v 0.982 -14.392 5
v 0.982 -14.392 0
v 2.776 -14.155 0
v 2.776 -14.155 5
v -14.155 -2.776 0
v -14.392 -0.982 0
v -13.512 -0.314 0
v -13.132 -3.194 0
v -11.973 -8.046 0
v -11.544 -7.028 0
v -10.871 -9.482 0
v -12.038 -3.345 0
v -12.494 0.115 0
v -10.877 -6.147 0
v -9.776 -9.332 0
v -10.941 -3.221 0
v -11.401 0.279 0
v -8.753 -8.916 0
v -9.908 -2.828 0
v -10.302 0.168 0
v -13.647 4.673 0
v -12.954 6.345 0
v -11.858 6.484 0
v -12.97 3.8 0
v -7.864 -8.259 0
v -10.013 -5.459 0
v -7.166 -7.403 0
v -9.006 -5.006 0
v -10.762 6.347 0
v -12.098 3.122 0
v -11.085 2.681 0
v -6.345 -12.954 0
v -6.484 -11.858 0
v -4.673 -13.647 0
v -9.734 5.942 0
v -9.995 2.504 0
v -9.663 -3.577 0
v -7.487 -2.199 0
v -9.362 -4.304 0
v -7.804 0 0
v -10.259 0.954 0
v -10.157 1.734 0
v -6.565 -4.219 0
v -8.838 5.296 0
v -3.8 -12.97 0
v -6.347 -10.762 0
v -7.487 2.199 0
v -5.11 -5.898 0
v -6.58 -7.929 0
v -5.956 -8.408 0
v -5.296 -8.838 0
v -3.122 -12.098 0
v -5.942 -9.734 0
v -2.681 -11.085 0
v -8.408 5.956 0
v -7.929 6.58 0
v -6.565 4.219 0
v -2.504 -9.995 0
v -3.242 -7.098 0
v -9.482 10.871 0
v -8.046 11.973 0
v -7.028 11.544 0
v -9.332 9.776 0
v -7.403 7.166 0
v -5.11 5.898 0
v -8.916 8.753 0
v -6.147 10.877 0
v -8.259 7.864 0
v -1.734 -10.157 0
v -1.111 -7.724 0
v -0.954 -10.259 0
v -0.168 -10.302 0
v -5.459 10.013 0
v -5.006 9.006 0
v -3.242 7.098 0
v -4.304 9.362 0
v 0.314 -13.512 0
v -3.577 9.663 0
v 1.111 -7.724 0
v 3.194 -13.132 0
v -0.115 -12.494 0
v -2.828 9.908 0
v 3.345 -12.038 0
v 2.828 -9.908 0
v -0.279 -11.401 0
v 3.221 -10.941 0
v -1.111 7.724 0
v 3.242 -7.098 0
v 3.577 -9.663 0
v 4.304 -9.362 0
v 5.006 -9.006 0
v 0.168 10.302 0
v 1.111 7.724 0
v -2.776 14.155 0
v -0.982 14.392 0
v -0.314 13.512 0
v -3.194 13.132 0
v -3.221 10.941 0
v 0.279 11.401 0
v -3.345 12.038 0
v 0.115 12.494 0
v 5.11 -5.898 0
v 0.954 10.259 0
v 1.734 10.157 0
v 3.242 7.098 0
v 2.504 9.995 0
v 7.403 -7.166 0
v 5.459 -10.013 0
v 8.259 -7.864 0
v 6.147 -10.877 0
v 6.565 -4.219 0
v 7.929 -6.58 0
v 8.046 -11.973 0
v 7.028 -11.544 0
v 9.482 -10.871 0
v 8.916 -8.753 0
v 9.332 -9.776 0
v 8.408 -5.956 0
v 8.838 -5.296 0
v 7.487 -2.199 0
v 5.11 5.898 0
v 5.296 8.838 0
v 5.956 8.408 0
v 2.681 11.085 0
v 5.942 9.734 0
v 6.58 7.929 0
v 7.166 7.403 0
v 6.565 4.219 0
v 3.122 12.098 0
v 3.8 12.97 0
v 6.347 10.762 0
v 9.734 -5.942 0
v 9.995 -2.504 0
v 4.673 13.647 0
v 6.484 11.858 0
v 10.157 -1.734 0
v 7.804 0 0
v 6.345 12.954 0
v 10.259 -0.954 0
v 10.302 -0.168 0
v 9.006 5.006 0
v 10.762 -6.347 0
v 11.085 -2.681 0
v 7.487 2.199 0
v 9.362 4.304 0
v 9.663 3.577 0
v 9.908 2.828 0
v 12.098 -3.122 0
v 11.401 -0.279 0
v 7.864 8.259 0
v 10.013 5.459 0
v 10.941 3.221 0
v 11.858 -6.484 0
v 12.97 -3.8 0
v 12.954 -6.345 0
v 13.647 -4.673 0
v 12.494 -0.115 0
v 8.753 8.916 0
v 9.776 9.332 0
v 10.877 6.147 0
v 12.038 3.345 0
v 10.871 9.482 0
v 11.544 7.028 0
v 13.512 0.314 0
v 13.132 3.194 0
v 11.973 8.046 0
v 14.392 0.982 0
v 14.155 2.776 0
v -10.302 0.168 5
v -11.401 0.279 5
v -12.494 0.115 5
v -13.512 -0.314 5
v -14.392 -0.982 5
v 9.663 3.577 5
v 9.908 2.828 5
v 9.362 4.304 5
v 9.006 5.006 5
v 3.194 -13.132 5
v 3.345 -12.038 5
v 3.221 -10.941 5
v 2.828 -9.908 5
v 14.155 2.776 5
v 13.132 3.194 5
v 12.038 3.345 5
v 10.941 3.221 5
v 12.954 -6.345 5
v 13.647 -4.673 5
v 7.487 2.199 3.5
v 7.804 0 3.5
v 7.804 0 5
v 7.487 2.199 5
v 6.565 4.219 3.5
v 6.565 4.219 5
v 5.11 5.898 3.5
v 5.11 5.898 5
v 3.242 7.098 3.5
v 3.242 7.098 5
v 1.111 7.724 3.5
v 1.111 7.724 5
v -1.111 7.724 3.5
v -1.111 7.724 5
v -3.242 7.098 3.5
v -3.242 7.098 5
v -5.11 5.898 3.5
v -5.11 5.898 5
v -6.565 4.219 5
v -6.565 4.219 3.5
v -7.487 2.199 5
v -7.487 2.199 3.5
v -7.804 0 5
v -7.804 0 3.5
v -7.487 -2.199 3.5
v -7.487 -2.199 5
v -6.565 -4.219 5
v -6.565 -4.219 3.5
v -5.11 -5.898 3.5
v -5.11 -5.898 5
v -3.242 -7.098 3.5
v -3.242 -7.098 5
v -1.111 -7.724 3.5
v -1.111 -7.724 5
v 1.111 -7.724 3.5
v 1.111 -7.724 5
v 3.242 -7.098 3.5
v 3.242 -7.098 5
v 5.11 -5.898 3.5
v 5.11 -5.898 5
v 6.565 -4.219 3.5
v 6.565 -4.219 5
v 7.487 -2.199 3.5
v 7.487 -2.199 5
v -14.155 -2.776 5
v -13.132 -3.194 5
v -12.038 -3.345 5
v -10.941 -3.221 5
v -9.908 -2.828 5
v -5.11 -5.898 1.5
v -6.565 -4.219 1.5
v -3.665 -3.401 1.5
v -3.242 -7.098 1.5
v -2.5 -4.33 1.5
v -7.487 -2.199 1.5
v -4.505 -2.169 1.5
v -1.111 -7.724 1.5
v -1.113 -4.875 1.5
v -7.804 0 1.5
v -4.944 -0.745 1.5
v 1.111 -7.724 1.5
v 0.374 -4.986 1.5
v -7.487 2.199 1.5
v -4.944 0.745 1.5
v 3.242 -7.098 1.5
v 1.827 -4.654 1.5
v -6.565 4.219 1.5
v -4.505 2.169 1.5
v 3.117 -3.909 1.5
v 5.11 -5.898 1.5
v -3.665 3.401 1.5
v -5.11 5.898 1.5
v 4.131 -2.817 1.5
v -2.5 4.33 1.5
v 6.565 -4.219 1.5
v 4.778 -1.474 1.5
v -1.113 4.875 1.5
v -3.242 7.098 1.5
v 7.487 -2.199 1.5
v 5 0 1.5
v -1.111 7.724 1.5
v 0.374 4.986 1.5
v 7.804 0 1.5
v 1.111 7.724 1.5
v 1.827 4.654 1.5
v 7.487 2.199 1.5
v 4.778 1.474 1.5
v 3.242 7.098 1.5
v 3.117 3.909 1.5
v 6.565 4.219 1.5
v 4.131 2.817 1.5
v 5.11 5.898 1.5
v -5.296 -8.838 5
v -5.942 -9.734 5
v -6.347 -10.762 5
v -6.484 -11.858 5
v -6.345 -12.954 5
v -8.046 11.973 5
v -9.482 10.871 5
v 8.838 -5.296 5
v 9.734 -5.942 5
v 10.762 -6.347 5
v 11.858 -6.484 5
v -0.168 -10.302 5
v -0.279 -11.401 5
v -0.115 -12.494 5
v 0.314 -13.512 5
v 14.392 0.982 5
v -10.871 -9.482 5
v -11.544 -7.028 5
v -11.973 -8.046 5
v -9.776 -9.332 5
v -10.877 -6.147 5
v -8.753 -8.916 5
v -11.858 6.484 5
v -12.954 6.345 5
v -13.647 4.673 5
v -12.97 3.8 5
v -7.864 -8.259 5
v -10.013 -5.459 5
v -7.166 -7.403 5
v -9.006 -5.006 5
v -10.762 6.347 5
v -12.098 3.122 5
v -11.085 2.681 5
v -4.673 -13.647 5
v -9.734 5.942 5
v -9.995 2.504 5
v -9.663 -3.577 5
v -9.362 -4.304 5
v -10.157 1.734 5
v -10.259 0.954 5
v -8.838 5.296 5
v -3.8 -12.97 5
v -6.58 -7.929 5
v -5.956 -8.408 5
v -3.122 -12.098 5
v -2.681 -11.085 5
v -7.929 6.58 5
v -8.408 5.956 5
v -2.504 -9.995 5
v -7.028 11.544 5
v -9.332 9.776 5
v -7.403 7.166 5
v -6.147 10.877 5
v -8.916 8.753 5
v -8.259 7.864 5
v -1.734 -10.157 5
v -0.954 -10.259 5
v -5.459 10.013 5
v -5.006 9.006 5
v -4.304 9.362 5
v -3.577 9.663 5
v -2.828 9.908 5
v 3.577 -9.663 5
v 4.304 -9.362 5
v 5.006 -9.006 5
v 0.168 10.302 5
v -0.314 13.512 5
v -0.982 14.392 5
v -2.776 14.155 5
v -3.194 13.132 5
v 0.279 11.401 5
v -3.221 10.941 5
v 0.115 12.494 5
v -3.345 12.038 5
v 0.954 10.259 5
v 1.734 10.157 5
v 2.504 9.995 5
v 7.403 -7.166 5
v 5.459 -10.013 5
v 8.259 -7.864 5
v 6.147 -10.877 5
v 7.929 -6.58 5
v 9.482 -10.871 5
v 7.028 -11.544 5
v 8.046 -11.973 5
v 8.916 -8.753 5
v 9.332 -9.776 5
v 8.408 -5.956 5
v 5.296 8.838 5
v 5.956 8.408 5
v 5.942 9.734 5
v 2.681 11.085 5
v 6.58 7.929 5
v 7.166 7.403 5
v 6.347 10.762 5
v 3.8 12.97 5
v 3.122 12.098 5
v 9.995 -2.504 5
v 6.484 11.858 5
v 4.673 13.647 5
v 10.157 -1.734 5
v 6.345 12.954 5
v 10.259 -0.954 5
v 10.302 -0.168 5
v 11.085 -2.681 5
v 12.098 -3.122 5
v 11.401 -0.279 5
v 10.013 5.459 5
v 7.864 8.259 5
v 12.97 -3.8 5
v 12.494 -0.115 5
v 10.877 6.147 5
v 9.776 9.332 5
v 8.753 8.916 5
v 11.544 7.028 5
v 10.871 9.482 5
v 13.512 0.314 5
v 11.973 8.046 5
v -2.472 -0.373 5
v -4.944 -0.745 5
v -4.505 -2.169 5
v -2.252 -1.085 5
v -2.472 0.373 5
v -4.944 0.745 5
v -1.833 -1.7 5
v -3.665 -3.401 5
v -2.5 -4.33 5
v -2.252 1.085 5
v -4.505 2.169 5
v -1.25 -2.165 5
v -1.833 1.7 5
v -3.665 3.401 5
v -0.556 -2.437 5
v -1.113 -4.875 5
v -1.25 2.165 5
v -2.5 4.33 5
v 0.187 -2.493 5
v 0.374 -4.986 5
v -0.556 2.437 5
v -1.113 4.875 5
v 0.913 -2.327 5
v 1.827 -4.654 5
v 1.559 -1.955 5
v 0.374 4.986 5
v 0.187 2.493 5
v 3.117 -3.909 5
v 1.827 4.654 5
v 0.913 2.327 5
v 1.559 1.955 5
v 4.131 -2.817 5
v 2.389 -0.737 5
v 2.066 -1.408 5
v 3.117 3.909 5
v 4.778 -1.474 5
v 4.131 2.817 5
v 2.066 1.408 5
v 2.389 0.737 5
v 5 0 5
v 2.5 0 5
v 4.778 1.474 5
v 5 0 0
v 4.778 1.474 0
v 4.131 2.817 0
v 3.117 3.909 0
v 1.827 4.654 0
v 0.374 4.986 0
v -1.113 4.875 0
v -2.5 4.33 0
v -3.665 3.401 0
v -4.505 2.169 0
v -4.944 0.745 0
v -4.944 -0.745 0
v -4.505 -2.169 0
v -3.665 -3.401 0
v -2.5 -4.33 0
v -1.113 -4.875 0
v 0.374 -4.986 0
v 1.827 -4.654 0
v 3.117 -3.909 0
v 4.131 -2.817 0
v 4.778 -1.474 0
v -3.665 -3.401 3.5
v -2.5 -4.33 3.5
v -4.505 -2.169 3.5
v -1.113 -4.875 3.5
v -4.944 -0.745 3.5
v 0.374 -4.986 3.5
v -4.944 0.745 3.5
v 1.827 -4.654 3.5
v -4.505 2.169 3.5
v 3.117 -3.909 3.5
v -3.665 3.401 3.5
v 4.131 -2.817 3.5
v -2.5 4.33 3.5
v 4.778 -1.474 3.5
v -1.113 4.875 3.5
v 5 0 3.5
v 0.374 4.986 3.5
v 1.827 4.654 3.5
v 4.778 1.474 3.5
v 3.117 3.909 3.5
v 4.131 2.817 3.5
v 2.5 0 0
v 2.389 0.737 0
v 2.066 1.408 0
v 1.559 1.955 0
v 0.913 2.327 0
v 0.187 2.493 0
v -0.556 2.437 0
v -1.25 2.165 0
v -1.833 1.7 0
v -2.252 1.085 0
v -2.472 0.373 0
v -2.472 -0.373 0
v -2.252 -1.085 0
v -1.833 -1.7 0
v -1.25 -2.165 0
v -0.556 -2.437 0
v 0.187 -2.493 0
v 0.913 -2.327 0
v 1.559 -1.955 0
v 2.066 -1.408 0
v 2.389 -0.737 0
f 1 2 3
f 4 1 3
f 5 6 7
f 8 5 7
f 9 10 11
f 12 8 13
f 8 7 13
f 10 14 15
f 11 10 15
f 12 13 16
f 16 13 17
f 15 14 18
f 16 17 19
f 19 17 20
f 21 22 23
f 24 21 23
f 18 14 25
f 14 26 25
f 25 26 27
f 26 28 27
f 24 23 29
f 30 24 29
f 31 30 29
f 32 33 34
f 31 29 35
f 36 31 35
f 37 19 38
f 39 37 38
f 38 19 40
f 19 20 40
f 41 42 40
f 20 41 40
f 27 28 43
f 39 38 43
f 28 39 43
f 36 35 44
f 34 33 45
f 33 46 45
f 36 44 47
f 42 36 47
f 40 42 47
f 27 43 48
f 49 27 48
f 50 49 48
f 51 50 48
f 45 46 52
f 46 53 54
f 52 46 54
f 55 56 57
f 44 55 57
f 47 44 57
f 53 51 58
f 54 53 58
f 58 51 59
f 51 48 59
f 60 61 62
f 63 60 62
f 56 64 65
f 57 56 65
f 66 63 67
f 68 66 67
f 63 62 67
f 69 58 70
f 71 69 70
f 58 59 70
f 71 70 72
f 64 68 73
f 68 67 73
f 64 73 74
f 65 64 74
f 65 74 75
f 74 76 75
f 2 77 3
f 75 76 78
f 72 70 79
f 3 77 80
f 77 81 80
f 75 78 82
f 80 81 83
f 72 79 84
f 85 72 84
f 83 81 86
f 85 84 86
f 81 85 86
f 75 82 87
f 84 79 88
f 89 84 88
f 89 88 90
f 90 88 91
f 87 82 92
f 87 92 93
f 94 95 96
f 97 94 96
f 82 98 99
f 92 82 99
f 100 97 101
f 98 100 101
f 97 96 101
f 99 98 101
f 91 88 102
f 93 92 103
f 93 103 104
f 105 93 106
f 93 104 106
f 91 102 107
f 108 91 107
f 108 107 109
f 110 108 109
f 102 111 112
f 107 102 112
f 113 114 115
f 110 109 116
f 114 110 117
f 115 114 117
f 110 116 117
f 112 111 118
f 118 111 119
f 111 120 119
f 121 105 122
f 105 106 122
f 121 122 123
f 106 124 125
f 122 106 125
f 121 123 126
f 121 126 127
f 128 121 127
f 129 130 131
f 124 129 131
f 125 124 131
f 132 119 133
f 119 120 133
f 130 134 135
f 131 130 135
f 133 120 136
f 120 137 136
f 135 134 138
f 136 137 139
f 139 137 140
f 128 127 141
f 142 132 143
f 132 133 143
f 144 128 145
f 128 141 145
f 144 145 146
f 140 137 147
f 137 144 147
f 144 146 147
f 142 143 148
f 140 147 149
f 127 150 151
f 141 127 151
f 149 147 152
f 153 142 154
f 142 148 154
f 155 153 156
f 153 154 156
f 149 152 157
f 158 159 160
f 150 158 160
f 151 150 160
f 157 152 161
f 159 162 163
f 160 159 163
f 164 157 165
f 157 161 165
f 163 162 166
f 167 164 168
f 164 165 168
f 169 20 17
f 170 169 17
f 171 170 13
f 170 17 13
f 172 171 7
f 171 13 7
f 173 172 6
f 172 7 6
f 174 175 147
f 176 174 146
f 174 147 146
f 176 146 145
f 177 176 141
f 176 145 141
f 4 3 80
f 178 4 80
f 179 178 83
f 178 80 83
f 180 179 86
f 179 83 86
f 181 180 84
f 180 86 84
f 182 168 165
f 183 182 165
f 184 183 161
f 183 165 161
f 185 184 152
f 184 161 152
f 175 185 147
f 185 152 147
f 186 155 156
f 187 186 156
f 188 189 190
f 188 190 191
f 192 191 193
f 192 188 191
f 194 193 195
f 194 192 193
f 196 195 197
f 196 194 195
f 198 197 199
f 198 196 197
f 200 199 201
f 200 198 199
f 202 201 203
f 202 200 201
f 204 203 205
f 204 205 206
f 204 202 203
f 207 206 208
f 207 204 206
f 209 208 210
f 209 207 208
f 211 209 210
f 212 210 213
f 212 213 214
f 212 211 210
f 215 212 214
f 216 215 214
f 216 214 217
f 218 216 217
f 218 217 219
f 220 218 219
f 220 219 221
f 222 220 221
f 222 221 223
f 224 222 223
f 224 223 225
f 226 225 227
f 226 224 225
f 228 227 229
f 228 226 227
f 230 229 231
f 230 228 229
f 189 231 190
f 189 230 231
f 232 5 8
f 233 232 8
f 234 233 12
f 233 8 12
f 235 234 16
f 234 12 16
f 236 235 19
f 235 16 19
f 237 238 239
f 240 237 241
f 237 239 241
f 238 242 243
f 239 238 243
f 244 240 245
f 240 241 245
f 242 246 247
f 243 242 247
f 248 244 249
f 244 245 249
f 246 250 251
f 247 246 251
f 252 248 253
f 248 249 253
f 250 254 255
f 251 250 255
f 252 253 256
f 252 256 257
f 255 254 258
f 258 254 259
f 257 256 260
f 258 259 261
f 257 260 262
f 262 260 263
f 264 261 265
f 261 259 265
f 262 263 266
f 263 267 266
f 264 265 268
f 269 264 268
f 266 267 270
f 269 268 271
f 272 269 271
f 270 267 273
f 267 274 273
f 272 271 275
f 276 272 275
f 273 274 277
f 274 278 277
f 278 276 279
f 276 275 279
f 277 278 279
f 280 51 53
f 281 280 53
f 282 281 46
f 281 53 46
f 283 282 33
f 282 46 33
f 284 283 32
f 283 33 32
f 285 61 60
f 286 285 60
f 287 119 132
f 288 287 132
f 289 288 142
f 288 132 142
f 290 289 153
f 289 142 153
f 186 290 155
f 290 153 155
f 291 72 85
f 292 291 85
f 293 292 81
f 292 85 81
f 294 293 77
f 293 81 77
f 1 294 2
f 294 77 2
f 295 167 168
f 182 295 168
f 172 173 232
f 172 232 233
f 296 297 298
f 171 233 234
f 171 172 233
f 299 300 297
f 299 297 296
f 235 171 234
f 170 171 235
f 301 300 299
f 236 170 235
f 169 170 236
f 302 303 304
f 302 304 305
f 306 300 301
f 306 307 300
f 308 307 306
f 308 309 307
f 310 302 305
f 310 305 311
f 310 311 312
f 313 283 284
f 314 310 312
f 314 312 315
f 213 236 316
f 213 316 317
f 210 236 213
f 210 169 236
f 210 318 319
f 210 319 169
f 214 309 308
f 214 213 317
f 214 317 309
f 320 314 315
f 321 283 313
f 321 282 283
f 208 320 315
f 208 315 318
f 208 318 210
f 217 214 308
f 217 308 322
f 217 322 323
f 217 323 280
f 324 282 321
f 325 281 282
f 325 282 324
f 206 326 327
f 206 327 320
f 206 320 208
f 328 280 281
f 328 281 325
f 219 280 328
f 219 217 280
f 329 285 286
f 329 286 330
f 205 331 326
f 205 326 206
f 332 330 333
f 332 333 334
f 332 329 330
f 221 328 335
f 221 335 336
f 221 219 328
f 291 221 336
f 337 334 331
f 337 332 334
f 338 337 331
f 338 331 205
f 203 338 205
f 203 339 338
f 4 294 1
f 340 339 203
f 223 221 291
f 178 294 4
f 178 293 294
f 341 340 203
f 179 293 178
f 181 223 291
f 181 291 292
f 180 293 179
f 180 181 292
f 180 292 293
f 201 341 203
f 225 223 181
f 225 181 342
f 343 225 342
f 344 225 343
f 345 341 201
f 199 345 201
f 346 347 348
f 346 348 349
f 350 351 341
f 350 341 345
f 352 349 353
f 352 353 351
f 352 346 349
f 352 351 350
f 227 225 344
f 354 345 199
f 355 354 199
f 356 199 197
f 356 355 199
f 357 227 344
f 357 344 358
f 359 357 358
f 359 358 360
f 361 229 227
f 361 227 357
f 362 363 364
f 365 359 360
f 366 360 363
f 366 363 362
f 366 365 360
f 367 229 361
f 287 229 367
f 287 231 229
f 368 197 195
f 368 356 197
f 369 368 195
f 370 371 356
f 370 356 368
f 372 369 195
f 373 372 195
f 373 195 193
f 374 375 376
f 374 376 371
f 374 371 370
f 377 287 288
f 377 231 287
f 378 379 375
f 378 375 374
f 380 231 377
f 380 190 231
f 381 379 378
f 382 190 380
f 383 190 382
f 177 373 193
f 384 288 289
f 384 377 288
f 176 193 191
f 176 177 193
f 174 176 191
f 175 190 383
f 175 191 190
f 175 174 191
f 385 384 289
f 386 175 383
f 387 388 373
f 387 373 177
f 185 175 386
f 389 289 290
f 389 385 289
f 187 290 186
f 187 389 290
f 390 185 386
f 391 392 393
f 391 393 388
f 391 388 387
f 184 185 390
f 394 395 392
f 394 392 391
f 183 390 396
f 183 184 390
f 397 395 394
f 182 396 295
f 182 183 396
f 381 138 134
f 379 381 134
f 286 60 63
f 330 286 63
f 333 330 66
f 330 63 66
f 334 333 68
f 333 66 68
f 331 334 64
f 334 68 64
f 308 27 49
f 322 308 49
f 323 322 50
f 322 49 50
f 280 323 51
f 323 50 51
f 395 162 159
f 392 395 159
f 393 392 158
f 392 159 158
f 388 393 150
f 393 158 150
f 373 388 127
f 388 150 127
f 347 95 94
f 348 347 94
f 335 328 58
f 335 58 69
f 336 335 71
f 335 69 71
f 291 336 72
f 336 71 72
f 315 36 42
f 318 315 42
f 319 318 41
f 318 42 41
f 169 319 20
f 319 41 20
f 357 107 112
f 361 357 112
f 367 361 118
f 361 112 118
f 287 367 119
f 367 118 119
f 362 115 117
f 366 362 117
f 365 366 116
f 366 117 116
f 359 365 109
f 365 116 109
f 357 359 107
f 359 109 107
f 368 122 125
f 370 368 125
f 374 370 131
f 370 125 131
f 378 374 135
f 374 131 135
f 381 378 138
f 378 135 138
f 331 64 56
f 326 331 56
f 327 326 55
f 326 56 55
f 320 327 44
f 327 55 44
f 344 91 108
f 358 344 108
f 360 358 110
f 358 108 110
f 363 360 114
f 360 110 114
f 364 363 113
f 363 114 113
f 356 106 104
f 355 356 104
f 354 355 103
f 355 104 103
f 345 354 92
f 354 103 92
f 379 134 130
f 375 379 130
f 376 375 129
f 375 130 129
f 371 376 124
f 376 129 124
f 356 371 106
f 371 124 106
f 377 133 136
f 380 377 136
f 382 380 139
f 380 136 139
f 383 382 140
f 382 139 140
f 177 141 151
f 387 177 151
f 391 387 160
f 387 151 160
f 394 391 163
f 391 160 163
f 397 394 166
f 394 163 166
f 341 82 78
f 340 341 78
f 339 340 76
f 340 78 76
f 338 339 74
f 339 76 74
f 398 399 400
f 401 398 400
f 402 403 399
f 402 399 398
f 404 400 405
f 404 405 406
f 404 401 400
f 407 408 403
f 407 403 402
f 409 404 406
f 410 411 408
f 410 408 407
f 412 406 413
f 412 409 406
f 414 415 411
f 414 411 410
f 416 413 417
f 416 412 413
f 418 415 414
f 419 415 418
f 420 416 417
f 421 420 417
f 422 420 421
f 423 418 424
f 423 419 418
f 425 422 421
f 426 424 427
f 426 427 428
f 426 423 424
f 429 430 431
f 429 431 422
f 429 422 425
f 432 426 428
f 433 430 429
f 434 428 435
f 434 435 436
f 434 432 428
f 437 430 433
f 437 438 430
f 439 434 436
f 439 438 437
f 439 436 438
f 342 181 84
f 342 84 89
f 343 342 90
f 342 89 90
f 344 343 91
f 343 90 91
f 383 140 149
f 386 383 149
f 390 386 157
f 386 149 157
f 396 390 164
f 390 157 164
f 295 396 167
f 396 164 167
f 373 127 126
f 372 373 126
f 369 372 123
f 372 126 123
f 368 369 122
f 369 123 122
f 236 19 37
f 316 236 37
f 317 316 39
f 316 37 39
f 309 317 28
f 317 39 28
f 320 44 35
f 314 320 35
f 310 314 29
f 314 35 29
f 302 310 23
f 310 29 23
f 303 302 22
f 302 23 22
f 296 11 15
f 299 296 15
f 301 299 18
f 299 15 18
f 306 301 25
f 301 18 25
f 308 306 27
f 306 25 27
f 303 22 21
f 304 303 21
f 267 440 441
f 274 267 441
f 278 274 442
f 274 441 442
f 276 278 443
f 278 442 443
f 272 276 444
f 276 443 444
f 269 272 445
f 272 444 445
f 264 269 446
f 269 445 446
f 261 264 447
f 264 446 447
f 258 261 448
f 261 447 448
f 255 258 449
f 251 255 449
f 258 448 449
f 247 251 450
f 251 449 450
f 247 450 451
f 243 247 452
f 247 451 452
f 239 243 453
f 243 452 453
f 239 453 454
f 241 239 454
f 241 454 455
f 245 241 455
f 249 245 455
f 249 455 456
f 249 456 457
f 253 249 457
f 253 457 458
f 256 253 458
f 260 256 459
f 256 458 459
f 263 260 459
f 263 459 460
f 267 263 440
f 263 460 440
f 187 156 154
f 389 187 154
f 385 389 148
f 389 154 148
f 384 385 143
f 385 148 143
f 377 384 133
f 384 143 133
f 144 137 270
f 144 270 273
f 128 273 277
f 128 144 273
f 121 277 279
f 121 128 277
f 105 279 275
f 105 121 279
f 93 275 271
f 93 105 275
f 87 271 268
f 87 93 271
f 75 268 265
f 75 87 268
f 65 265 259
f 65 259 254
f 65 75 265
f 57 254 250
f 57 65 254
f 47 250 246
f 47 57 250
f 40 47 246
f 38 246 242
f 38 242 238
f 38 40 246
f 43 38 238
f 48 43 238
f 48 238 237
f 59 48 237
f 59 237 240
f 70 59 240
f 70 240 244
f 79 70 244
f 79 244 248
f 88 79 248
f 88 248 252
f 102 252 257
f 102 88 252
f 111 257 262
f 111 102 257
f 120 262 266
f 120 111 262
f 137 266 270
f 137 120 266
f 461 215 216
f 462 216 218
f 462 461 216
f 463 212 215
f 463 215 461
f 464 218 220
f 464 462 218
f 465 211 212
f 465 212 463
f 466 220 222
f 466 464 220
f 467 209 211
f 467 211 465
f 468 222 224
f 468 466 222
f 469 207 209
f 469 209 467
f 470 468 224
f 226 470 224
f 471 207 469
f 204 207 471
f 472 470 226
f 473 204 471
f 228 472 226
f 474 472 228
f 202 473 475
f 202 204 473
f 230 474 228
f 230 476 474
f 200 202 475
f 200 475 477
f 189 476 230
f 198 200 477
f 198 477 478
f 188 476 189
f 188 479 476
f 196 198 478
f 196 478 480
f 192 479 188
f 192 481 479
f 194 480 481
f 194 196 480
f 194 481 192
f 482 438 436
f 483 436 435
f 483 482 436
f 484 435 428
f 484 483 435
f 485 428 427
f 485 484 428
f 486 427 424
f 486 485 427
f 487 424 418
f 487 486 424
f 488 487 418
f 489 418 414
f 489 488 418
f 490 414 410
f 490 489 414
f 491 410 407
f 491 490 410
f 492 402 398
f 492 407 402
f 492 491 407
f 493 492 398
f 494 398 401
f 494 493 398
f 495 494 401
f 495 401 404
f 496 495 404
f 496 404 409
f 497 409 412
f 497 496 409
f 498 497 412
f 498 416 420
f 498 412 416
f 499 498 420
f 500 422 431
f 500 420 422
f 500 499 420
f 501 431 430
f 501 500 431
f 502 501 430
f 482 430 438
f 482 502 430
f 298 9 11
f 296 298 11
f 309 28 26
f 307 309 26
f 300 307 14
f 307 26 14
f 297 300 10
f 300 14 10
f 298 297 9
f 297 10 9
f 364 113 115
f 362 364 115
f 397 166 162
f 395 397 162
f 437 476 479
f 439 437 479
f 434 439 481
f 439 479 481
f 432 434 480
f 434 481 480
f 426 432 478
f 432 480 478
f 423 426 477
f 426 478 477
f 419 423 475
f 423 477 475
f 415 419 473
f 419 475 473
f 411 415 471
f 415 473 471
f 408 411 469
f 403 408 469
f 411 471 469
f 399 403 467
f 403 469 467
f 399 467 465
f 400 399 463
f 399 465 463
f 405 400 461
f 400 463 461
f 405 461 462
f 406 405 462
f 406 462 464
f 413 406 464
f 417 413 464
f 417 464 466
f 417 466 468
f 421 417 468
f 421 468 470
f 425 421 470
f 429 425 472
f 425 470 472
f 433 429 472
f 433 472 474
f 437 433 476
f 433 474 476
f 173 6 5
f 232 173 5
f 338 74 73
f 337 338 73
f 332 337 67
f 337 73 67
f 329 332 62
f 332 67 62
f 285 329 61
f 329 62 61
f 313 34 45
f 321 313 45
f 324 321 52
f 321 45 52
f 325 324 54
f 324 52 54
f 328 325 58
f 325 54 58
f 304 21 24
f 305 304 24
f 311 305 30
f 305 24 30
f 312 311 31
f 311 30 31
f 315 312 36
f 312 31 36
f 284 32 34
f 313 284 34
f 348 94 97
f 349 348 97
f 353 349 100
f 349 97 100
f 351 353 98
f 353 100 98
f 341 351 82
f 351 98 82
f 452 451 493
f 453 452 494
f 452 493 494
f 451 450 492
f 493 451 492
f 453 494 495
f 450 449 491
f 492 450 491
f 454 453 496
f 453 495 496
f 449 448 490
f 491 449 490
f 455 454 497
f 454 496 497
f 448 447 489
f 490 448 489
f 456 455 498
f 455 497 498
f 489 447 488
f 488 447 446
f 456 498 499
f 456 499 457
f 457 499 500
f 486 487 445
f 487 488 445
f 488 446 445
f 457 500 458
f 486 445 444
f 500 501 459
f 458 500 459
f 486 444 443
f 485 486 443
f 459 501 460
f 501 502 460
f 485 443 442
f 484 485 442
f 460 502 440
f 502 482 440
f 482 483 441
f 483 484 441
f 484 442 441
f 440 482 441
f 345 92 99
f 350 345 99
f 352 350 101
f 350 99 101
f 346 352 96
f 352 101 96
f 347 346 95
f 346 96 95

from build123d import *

# Parameters (mm, degrees)
F2_R     = 2.5
F4_DEPTH = 5
F5_COUNT = 12
F5_ANGLE = 330
F6_R     = 7.8035714286
F6_R_2   = 5
F7_DEPTH = 1.5
F8_START = 3.5
F8_DEPTH = 1.5


# Not quite as in the source:
# - a feature names something its author has since deleted; it is built from what else it names


with BuildPart() as f4:
    # F2 (on Top) → F4 (new body)
    with BuildSketch(Plane.XY):
        with BuildLine():
            ThreePointArc((-2.828404167, 9.9077602944), (-1.3448859448, 10.2154229467), (0.1677115736, 10.3022064147))
            ThreePointArc((0.1677115736, 10.3022064147), (0.1151870939, 12.4936954813), (-0.981879075, 14.3915439923))
            Line((-0.981879075, 14.3915439923), (-2.7763833168, 14.1552930269))
            ThreePointArc((-2.7763833168, 14.1552930269), (-3.3448685232, 12.0381705175), (-2.828404167, 9.9077602944))
        make_face()
        with BuildLine():
            ThreePointArc((-2.828404167, 9.9077602944), (-6.2056796493, -8.2251519301), (10.3035714286, 0))
            ThreePointArc((10.3035714286, 0), (7.3447808804, 7.2261869615), (0.1677115736, 10.3022064147))
            ThreePointArc((0.1677115736, 10.3022064147), (-1.3448859448, 10.2154229467), (-2.828404167, 9.9077602944))
        make_face()
        Circle(F2_R, mode=Mode.SUBTRACT)
    extrude(amount=F4_DEPTH)

    # F5: F4 ×12 about axis
    f5_axis = Axis((0, 0, 30.7848658413), (0, 0, 1))


with BuildPart() as f4_1:
    add(f4.part)
    for i in range(1, F5_COUNT):
        add(f4.part.rotate(f5_axis, i * F5_ANGLE / (F5_COUNT - 1)))

    # F6 (on Top) → F7 (cut)
    with BuildSketch(Plane.XY):
        Circle(F6_R)
        Circle(F6_R_2, mode=Mode.SUBTRACT)
    extrude(amount=F7_DEPTH, mode=Mode.SUBTRACT)

    # F6 (on Top) → F8 (cut)
    with BuildSketch(Plane.XY.offset(F8_START)):
        Circle(F6_R)
        Circle(F6_R_2, mode=Mode.SUBTRACT)
    extrude(amount=F8_DEPTH, mode=Mode.SUBTRACT)


solid = f4_1.part
